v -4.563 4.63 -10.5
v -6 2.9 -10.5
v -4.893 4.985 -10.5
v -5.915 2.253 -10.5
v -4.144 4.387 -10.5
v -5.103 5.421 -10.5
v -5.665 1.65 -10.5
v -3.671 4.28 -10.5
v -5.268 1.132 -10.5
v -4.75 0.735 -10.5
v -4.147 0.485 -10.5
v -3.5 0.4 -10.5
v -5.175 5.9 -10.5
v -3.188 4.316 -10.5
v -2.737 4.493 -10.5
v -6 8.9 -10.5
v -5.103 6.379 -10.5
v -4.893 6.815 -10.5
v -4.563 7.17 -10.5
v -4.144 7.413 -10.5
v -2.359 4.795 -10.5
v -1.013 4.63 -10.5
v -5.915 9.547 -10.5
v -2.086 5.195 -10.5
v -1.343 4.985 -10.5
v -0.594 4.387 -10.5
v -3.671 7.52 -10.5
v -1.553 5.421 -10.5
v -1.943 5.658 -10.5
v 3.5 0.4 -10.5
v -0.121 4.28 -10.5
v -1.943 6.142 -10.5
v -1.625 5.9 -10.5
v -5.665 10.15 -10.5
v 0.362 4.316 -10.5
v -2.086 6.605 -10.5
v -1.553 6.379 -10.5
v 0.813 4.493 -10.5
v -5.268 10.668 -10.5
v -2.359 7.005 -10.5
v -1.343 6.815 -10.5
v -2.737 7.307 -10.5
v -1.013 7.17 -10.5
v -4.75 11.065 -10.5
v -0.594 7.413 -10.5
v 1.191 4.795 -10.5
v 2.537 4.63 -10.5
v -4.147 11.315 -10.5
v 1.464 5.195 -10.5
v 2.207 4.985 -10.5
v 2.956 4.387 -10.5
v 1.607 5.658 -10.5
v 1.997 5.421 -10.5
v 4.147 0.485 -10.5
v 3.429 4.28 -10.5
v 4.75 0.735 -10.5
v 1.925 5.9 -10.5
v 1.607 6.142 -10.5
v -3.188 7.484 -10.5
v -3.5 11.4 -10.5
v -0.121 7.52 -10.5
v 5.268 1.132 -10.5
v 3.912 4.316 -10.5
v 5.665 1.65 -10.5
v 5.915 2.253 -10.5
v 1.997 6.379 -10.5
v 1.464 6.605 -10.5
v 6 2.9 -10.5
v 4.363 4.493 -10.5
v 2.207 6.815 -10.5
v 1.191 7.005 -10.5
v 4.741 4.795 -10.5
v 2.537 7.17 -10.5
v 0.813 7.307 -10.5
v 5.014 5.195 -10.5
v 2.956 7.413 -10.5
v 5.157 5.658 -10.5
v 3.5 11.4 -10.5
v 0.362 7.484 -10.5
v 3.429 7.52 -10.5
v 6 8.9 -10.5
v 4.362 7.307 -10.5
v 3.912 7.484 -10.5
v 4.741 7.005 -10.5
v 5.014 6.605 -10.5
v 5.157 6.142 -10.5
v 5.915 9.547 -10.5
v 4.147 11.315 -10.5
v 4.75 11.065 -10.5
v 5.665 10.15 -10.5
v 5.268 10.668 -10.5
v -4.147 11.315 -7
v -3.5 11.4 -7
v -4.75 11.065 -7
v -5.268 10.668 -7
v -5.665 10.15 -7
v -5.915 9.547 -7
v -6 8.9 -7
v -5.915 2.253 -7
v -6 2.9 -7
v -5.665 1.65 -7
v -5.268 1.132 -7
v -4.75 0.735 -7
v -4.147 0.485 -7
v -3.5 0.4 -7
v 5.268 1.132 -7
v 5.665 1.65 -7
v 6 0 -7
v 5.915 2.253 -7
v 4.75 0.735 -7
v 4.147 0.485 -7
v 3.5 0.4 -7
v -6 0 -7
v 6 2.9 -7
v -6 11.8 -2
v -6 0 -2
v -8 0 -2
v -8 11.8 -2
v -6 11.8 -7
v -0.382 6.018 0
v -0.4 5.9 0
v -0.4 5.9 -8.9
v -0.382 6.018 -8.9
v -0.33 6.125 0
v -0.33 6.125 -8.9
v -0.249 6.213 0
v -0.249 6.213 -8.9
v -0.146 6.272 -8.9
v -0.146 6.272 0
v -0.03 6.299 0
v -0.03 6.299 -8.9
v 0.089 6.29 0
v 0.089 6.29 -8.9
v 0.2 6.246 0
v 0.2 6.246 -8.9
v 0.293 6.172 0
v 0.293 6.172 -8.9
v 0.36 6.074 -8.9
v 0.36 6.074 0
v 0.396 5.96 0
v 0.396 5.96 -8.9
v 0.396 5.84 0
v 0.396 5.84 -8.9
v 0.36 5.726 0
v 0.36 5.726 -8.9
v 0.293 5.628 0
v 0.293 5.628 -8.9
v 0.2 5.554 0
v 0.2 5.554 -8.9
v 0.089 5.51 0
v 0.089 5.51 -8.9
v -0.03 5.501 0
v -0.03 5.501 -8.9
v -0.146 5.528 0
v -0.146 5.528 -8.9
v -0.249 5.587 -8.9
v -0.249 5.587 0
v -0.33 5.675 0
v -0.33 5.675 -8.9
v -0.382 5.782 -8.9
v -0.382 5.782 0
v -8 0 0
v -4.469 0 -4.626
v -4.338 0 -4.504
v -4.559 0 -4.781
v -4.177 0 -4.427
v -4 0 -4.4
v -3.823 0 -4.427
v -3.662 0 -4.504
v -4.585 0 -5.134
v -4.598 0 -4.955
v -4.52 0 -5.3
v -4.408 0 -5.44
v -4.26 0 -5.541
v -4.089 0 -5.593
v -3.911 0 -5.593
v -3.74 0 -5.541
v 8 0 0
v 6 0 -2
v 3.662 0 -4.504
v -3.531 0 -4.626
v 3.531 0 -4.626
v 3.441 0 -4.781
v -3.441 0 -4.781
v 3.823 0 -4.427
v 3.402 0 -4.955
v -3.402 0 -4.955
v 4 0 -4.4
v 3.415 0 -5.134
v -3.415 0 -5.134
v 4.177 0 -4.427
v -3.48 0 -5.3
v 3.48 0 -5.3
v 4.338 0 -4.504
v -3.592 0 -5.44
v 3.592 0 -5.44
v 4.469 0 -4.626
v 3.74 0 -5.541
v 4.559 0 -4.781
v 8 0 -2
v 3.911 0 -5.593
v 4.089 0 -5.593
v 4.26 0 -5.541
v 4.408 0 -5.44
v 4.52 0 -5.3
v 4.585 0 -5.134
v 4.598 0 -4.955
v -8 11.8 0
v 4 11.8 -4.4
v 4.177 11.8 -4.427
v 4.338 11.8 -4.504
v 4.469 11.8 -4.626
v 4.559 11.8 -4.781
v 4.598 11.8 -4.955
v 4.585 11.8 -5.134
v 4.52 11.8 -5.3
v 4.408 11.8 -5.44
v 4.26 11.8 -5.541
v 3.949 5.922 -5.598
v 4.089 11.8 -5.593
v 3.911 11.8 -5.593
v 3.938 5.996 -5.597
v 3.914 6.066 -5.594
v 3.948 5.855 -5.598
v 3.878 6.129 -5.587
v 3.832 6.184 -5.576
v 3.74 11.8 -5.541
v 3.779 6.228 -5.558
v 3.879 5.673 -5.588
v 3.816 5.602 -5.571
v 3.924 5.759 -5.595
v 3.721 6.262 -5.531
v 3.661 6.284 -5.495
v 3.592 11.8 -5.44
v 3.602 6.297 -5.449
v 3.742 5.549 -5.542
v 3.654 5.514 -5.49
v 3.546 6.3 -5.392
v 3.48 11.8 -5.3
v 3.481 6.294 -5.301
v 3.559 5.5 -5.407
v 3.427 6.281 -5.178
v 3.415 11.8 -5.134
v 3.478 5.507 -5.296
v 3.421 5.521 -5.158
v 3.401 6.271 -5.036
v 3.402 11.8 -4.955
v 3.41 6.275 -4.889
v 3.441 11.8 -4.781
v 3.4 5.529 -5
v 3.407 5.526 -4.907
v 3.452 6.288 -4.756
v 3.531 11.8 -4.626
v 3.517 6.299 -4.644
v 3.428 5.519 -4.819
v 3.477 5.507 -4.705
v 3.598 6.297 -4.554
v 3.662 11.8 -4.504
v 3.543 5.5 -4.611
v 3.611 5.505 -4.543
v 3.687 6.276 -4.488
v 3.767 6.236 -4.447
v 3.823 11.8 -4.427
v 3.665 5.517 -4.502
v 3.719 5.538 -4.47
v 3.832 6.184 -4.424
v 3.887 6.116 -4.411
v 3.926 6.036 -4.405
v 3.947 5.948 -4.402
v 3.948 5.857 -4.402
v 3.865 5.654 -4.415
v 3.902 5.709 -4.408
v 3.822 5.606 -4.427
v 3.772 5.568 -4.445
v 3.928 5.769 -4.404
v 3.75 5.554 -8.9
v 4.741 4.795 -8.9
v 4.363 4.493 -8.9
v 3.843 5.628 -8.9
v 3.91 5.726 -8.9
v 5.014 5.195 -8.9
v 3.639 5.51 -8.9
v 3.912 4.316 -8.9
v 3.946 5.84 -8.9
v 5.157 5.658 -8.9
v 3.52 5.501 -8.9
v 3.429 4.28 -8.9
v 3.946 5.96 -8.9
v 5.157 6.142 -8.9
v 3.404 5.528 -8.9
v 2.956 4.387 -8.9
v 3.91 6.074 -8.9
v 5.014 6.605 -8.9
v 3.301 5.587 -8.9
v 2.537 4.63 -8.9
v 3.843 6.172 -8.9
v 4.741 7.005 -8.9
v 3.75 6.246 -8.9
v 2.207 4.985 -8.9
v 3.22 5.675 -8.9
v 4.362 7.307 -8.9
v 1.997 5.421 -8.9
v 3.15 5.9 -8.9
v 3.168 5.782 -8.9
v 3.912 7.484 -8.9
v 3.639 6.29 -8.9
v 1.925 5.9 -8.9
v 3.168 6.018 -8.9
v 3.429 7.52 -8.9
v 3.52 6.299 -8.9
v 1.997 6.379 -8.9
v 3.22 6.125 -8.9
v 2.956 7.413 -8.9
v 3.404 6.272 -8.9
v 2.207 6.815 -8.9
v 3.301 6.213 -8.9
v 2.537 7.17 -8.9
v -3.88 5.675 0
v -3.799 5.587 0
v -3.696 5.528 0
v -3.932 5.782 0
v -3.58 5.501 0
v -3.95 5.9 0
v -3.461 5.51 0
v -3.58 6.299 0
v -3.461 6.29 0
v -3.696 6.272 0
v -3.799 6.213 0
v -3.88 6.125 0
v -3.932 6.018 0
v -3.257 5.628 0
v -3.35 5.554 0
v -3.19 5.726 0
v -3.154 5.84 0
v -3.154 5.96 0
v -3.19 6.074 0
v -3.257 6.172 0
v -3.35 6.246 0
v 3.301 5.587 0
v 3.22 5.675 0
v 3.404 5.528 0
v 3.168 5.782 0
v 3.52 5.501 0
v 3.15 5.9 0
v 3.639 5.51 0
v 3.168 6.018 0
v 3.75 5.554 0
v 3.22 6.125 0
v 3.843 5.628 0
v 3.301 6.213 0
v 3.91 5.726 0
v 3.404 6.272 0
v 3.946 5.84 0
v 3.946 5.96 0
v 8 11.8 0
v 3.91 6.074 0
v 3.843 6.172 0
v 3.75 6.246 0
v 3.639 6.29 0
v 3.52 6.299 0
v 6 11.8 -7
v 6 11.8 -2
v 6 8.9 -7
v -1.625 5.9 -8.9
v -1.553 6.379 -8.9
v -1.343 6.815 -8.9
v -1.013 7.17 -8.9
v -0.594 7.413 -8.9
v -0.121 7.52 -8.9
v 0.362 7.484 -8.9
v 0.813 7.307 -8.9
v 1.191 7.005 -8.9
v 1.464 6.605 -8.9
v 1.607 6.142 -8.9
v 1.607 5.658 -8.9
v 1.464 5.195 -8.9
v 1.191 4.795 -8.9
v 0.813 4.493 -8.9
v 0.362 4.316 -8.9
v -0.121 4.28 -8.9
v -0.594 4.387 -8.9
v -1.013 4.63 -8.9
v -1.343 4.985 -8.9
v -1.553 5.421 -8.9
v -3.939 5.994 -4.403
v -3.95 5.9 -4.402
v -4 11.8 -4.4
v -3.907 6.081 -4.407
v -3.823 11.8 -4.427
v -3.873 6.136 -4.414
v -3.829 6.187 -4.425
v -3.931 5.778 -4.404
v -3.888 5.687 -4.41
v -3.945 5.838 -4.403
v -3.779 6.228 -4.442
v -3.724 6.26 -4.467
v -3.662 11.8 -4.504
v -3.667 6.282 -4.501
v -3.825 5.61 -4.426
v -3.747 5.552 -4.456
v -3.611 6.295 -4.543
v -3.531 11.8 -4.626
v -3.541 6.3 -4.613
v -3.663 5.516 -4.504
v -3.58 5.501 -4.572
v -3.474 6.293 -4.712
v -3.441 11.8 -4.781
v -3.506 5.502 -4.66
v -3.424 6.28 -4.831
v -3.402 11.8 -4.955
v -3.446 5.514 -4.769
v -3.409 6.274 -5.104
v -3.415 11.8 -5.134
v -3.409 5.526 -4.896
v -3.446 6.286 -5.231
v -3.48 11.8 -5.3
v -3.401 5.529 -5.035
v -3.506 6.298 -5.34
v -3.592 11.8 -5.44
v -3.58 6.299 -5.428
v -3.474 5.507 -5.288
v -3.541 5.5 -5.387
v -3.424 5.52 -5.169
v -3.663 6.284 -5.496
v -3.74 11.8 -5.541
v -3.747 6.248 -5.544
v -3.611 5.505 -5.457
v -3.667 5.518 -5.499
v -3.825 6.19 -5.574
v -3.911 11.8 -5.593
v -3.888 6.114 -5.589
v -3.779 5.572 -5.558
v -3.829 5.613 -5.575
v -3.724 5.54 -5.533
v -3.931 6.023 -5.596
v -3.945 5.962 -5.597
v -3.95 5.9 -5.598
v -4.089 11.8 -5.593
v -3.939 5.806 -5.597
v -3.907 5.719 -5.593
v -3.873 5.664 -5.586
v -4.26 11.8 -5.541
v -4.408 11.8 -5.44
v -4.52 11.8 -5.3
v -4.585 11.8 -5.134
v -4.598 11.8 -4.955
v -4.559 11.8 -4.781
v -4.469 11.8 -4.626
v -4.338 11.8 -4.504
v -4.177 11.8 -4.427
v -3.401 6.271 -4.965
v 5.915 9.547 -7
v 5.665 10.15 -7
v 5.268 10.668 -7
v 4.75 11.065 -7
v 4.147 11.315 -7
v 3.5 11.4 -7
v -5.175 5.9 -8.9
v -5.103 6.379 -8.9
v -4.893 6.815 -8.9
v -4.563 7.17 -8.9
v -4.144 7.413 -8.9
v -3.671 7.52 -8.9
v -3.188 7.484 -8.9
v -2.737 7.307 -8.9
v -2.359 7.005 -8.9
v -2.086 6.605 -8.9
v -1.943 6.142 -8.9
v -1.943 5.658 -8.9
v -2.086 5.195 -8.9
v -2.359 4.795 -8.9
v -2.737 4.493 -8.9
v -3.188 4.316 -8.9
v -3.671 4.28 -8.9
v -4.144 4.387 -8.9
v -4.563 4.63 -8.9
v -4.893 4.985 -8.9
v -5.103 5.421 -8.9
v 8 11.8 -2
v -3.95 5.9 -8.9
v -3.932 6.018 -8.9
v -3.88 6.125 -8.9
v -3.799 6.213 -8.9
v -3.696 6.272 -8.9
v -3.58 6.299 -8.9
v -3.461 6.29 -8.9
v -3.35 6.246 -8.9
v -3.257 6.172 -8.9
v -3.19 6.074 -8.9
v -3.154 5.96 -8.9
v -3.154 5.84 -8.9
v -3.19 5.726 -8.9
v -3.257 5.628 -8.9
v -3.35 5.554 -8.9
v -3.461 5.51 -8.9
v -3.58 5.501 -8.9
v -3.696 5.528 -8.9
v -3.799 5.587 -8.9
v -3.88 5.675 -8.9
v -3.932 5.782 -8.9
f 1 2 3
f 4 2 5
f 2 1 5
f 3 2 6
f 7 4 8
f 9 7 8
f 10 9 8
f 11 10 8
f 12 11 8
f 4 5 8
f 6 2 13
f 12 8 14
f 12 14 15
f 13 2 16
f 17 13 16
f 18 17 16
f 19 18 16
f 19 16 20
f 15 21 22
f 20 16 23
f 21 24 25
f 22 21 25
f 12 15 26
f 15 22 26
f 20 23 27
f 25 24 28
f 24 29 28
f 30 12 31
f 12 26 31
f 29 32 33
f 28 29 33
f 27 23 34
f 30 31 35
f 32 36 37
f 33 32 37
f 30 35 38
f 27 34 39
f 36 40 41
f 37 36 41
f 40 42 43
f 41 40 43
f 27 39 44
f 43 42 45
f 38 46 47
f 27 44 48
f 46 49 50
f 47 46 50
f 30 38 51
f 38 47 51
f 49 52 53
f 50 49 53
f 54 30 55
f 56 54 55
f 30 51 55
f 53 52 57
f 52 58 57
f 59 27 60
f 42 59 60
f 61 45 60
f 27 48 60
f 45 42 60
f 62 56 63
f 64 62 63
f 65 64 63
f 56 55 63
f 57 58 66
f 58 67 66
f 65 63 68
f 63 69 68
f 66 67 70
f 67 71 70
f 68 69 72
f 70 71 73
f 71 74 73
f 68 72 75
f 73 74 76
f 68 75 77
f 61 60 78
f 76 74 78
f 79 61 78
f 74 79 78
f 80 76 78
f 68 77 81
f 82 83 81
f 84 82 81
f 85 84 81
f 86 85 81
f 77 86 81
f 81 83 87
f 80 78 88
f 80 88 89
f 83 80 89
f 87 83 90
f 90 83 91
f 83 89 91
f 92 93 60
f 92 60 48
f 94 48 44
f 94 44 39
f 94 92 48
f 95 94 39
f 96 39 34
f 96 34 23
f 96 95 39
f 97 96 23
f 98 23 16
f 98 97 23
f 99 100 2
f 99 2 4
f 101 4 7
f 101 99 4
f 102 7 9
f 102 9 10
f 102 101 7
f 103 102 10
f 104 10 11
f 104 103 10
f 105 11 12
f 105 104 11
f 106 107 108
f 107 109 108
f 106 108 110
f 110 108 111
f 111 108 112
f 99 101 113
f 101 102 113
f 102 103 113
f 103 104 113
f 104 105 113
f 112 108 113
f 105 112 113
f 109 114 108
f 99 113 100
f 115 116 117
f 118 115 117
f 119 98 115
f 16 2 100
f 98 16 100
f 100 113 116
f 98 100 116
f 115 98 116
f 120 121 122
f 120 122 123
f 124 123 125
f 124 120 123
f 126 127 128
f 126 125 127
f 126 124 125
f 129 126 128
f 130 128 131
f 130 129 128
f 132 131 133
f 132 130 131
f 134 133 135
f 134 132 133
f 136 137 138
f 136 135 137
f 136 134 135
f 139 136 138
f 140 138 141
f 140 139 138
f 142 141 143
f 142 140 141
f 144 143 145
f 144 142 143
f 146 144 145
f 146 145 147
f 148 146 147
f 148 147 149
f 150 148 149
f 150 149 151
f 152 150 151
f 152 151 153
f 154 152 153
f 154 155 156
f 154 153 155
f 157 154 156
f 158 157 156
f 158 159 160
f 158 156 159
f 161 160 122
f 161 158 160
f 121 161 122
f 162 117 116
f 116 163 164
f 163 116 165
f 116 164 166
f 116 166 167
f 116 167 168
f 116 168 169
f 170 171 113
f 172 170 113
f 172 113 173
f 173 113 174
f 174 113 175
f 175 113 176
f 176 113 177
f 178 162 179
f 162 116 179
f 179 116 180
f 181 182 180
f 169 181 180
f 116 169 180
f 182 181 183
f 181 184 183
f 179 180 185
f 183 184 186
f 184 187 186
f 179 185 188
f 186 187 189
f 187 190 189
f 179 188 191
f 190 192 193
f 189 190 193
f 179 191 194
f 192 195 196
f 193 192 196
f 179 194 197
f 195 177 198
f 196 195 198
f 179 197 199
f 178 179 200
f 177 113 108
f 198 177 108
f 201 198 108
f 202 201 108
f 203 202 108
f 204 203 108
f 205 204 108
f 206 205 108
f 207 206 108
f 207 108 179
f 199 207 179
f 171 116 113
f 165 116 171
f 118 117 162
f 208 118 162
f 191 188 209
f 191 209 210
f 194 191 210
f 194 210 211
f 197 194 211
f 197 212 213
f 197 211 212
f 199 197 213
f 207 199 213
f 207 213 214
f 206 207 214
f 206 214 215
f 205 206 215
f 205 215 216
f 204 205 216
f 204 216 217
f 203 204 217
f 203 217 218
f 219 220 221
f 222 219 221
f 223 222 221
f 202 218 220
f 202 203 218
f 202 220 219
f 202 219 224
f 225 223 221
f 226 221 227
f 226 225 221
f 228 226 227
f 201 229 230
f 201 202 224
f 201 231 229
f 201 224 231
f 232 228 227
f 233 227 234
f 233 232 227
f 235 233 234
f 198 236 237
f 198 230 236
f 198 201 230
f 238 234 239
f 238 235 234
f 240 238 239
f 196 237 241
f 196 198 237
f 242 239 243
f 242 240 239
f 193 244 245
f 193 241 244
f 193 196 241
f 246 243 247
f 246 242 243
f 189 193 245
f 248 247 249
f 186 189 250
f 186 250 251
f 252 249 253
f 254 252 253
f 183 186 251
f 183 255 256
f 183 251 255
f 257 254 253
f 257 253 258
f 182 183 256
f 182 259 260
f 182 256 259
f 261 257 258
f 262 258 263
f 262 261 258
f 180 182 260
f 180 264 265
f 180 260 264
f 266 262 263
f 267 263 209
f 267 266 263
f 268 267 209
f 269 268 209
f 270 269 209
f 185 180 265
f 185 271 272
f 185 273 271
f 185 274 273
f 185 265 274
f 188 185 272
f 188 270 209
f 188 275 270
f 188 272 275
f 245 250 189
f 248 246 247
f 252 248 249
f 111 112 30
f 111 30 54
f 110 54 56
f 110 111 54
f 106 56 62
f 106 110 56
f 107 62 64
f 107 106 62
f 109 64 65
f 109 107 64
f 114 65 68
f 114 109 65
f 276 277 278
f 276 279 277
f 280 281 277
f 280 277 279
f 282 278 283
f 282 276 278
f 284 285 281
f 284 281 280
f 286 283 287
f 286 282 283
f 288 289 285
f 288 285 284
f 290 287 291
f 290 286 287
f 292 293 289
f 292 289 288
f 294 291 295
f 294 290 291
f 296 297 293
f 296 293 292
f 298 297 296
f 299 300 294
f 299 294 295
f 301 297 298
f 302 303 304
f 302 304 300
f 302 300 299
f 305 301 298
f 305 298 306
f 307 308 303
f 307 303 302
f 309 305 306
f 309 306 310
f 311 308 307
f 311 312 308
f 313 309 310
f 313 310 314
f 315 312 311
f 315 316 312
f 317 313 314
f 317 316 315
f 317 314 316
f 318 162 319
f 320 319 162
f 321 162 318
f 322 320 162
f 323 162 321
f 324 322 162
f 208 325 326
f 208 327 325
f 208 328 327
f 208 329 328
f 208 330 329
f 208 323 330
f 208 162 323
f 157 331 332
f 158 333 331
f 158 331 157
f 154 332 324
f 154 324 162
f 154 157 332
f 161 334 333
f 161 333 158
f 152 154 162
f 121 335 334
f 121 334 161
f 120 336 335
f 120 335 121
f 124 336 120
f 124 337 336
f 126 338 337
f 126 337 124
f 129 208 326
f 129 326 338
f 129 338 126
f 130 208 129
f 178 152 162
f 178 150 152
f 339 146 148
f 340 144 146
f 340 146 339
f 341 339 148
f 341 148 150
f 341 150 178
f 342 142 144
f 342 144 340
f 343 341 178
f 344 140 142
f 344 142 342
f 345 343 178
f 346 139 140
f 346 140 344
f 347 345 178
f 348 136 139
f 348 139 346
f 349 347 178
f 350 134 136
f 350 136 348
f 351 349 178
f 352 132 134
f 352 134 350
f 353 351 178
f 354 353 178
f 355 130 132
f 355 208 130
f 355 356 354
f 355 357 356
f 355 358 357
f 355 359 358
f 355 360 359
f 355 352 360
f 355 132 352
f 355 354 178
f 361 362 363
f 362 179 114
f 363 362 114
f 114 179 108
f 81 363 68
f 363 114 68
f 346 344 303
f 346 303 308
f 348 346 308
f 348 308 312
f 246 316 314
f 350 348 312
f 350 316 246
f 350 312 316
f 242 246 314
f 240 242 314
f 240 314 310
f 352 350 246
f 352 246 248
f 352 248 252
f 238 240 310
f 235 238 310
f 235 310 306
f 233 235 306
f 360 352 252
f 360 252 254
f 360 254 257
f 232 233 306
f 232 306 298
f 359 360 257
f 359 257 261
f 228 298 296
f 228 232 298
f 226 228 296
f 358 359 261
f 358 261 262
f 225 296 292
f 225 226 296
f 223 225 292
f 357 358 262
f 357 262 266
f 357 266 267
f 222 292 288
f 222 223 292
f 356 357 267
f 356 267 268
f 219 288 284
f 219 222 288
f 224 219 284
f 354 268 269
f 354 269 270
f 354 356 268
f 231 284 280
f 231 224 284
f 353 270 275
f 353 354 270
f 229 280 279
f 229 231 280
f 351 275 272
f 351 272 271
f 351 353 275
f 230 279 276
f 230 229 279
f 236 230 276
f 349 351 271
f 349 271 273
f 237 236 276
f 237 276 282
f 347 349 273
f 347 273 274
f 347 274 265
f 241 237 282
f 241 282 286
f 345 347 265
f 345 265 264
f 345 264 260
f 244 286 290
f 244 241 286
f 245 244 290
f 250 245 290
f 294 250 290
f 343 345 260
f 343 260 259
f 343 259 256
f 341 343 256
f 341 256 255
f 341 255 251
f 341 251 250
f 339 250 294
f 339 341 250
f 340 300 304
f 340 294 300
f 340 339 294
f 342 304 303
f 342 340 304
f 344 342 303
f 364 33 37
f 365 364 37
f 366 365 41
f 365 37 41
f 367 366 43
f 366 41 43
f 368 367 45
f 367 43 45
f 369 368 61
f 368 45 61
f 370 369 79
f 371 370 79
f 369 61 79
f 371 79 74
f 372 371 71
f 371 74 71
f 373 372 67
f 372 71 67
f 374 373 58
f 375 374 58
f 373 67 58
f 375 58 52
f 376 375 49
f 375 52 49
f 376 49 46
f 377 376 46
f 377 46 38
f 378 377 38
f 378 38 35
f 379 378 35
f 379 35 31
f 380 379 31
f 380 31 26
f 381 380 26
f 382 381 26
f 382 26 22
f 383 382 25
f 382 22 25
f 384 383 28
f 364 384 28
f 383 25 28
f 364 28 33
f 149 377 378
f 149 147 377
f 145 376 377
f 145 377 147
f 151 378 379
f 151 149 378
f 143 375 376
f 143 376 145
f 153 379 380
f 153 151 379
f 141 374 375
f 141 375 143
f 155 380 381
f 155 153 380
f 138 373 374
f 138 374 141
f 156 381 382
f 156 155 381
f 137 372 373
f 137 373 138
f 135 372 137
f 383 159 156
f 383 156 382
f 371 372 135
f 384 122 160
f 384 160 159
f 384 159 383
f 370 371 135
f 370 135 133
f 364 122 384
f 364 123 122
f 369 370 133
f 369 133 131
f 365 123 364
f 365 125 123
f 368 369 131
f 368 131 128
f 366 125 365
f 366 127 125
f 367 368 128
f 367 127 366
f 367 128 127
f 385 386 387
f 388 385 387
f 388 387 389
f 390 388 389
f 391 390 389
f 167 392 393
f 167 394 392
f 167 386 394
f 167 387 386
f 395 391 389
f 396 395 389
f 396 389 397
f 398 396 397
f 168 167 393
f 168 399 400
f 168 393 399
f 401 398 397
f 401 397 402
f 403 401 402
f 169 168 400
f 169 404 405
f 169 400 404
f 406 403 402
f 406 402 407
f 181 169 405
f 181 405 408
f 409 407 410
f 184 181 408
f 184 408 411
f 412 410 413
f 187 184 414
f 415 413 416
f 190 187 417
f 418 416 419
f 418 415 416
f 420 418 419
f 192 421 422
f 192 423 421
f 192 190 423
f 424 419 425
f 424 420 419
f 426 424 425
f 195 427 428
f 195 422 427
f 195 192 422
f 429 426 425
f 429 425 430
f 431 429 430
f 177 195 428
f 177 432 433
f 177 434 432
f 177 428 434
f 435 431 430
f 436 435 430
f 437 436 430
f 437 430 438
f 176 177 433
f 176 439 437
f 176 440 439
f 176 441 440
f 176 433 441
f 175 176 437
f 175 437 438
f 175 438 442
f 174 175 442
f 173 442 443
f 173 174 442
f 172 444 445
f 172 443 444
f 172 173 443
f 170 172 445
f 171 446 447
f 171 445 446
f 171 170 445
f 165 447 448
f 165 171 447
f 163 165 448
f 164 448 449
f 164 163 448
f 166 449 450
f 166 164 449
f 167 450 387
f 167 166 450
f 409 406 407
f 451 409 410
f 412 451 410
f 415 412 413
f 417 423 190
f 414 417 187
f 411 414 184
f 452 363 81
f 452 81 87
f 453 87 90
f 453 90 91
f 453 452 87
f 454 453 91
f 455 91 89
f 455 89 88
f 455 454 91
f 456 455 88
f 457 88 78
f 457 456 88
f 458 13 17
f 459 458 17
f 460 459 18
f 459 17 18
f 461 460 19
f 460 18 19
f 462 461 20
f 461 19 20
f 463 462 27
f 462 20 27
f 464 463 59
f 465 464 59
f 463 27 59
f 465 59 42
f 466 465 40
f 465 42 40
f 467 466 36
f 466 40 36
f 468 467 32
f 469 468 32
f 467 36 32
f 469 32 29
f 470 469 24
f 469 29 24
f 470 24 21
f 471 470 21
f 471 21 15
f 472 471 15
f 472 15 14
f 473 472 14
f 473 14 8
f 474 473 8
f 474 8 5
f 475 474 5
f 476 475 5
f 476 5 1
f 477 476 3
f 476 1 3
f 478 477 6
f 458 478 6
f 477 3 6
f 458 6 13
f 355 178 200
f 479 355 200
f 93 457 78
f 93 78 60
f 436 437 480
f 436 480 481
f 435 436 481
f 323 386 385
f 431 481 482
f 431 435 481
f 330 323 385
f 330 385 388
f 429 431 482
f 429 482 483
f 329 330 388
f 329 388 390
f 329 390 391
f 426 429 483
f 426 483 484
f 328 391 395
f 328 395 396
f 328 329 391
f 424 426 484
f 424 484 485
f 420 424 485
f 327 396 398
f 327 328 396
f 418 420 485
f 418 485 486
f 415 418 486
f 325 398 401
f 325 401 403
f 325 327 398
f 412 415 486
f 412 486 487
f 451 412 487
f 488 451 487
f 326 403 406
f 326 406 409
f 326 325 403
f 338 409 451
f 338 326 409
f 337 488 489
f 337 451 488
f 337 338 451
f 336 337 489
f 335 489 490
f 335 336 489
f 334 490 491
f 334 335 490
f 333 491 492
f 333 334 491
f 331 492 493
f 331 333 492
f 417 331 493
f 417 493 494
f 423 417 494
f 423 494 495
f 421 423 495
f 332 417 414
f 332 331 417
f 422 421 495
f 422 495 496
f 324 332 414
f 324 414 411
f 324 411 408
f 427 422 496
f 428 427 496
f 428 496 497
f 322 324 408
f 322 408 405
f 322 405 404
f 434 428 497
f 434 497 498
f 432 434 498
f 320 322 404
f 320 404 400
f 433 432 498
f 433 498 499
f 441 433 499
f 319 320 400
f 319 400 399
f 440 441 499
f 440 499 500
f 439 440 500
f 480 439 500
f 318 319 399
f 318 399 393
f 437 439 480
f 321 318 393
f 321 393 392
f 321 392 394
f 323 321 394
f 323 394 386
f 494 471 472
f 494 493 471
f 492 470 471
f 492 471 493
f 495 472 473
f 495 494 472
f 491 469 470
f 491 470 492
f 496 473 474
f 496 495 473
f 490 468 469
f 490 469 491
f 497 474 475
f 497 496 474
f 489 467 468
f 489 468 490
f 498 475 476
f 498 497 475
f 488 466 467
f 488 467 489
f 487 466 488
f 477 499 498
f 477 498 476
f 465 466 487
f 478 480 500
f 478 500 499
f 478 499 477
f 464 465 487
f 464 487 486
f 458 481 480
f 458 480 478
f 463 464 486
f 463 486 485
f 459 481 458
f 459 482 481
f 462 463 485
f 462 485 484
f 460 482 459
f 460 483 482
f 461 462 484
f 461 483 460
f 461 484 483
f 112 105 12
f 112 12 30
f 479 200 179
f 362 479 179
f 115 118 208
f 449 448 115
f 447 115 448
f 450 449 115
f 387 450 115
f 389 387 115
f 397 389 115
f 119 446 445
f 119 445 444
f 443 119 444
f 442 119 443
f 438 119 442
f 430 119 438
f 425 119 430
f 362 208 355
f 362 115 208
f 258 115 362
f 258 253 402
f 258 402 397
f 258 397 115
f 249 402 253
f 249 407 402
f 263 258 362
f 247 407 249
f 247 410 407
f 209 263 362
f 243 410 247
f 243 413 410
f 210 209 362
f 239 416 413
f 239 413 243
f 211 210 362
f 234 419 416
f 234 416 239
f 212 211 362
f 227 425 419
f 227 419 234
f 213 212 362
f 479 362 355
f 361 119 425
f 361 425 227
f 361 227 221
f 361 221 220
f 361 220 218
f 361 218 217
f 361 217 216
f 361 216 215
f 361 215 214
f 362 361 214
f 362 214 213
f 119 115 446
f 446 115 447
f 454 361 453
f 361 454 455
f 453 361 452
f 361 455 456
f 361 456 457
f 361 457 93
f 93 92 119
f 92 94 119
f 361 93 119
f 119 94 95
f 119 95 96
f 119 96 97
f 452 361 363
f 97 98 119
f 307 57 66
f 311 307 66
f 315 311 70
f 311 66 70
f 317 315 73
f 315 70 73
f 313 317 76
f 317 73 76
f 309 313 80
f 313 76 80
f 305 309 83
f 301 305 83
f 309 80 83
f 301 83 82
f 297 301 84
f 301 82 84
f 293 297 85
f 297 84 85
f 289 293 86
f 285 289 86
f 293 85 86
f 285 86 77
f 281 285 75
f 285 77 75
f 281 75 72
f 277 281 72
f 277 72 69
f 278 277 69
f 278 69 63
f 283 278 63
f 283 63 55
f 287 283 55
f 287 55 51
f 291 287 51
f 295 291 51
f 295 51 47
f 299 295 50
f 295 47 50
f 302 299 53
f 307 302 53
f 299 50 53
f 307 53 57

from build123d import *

# Parameters (mm, degrees)
BOSS_EXTRUDE1_DEPTH     = 11.8
BOSS_EXTRUDE2_DEPTH     = 10.5
CUT_EXTRUDE1_DEPTH      = 18.705648816
CUT_EXTRUDE1_DEPTH_BACK = 18.705648816
SKETCH2_R               = 0.6
SKETCH5_R               = 1.625
CUT_EXTRUDE2_DEPTH      = 1.6
CUT_EXTRUDE5_DEPTH      = 17.806248838
CUT_EXTRUDE5_DEPTH_BACK = 17.806248838
SKETCH7_R               = 0.4


with BuildPart() as part:
    # Sketch1 → Boss-Extrude1 (new body)
    with BuildSketch(Plane(origin=(0, 0, 0), x_dir=(1, 0, 0), z_dir=(0, 1, 0))):
        Polygon((0, 0), (8, 0), (8, 2), (6, 2), (6, 7), (-6, 7), (-6, 2), (-8, 2), (-8, 0), align=None)
    extrude(amount=BOSS_EXTRUDE1_DEPTH)

    # Sketch4 → Boss-Extrude2 (add)
    with BuildSketch(Plane.XY):
        with BuildLine():
            Line((-6, 8.9), (-6, 2.9))
            ThreePointArc((-6, 2.9), (-5.267766953, 1.132233047), (-3.5, 0.4))
            Line((-3.5, 0.4), (3.5, 0.4))
            ThreePointArc((3.5, 0.4), (5.267766953, 1.132233047), (6, 2.9))
            Line((6, 2.9), (6, 8.9))
            ThreePointArc((6, 8.9), (5.267766953, 10.667766953), (3.5, 11.4))
            Line((3.5, 11.4), (-3.5, 11.4))
            ThreePointArc((-3.5, 11.4), (-5.267766953, 10.667766953), (-6, 8.9))
        make_face()
    extrude(amount=-BOSS_EXTRUDE2_DEPTH)

    # Sketch2 → Cut-Extrude1 (cut, two sides: drawn at the far end of the back side and taken through both)
    with BuildSketch(Plane(origin=(0, 11.8, 0), x_dir=(1, 0, 0), z_dir=(0, 1, 0)).offset(-CUT_EXTRUDE1_DEPTH_BACK)):
        with Locations(Location((-4, 5, 0), (0, 0, 270))):
            Circle(SKETCH2_R)
        with Locations(Location((4, 5, 0), (0, 0, 270))):
            Circle(SKETCH2_R)
    extrude(amount=CUT_EXTRUDE1_DEPTH + CUT_EXTRUDE1_DEPTH_BACK, mode=Mode.SUBTRACT)

    # Sketch5 → Cut-Extrude2 (cut)
    with BuildSketch(Plane(origin=(0, 0, -10.5), x_dir=(-1, 0, 0), z_dir=(0, 0, -1))):
        with Locations((3.55, 5.9)):
            Circle(SKETCH5_R)
        with Locations((-3.55, 5.9)):
            Circle(SKETCH5_R)
        with Locations((0, 5.9)):
            Circle(SKETCH5_R)
    extrude(amount=-CUT_EXTRUDE2_DEPTH, mode=Mode.SUBTRACT)

    # Sketch7 → Cut-Extrude5 (cut, two sides: drawn at the far end of the back side and taken through both)
    with BuildSketch(Plane(origin=(0, 0, -8.9), x_dir=(-1, 0, 0), z_dir=(0, 0, -1)).offset(-CUT_EXTRUDE5_DEPTH_BACK)):
        with Locations((-3.55, 5.9)):
            Circle(SKETCH7_R)
        with Locations((3.55, 5.9)):
            Circle(SKETCH7_R)
        with Locations((0, 5.9)):
            Circle(SKETCH7_R)
    extrude(amount=CUT_EXTRUDE5_DEPTH + CUT_EXTRUDE5_DEPTH_BACK, mode=Mode.SUBTRACT)


solid = part.part
